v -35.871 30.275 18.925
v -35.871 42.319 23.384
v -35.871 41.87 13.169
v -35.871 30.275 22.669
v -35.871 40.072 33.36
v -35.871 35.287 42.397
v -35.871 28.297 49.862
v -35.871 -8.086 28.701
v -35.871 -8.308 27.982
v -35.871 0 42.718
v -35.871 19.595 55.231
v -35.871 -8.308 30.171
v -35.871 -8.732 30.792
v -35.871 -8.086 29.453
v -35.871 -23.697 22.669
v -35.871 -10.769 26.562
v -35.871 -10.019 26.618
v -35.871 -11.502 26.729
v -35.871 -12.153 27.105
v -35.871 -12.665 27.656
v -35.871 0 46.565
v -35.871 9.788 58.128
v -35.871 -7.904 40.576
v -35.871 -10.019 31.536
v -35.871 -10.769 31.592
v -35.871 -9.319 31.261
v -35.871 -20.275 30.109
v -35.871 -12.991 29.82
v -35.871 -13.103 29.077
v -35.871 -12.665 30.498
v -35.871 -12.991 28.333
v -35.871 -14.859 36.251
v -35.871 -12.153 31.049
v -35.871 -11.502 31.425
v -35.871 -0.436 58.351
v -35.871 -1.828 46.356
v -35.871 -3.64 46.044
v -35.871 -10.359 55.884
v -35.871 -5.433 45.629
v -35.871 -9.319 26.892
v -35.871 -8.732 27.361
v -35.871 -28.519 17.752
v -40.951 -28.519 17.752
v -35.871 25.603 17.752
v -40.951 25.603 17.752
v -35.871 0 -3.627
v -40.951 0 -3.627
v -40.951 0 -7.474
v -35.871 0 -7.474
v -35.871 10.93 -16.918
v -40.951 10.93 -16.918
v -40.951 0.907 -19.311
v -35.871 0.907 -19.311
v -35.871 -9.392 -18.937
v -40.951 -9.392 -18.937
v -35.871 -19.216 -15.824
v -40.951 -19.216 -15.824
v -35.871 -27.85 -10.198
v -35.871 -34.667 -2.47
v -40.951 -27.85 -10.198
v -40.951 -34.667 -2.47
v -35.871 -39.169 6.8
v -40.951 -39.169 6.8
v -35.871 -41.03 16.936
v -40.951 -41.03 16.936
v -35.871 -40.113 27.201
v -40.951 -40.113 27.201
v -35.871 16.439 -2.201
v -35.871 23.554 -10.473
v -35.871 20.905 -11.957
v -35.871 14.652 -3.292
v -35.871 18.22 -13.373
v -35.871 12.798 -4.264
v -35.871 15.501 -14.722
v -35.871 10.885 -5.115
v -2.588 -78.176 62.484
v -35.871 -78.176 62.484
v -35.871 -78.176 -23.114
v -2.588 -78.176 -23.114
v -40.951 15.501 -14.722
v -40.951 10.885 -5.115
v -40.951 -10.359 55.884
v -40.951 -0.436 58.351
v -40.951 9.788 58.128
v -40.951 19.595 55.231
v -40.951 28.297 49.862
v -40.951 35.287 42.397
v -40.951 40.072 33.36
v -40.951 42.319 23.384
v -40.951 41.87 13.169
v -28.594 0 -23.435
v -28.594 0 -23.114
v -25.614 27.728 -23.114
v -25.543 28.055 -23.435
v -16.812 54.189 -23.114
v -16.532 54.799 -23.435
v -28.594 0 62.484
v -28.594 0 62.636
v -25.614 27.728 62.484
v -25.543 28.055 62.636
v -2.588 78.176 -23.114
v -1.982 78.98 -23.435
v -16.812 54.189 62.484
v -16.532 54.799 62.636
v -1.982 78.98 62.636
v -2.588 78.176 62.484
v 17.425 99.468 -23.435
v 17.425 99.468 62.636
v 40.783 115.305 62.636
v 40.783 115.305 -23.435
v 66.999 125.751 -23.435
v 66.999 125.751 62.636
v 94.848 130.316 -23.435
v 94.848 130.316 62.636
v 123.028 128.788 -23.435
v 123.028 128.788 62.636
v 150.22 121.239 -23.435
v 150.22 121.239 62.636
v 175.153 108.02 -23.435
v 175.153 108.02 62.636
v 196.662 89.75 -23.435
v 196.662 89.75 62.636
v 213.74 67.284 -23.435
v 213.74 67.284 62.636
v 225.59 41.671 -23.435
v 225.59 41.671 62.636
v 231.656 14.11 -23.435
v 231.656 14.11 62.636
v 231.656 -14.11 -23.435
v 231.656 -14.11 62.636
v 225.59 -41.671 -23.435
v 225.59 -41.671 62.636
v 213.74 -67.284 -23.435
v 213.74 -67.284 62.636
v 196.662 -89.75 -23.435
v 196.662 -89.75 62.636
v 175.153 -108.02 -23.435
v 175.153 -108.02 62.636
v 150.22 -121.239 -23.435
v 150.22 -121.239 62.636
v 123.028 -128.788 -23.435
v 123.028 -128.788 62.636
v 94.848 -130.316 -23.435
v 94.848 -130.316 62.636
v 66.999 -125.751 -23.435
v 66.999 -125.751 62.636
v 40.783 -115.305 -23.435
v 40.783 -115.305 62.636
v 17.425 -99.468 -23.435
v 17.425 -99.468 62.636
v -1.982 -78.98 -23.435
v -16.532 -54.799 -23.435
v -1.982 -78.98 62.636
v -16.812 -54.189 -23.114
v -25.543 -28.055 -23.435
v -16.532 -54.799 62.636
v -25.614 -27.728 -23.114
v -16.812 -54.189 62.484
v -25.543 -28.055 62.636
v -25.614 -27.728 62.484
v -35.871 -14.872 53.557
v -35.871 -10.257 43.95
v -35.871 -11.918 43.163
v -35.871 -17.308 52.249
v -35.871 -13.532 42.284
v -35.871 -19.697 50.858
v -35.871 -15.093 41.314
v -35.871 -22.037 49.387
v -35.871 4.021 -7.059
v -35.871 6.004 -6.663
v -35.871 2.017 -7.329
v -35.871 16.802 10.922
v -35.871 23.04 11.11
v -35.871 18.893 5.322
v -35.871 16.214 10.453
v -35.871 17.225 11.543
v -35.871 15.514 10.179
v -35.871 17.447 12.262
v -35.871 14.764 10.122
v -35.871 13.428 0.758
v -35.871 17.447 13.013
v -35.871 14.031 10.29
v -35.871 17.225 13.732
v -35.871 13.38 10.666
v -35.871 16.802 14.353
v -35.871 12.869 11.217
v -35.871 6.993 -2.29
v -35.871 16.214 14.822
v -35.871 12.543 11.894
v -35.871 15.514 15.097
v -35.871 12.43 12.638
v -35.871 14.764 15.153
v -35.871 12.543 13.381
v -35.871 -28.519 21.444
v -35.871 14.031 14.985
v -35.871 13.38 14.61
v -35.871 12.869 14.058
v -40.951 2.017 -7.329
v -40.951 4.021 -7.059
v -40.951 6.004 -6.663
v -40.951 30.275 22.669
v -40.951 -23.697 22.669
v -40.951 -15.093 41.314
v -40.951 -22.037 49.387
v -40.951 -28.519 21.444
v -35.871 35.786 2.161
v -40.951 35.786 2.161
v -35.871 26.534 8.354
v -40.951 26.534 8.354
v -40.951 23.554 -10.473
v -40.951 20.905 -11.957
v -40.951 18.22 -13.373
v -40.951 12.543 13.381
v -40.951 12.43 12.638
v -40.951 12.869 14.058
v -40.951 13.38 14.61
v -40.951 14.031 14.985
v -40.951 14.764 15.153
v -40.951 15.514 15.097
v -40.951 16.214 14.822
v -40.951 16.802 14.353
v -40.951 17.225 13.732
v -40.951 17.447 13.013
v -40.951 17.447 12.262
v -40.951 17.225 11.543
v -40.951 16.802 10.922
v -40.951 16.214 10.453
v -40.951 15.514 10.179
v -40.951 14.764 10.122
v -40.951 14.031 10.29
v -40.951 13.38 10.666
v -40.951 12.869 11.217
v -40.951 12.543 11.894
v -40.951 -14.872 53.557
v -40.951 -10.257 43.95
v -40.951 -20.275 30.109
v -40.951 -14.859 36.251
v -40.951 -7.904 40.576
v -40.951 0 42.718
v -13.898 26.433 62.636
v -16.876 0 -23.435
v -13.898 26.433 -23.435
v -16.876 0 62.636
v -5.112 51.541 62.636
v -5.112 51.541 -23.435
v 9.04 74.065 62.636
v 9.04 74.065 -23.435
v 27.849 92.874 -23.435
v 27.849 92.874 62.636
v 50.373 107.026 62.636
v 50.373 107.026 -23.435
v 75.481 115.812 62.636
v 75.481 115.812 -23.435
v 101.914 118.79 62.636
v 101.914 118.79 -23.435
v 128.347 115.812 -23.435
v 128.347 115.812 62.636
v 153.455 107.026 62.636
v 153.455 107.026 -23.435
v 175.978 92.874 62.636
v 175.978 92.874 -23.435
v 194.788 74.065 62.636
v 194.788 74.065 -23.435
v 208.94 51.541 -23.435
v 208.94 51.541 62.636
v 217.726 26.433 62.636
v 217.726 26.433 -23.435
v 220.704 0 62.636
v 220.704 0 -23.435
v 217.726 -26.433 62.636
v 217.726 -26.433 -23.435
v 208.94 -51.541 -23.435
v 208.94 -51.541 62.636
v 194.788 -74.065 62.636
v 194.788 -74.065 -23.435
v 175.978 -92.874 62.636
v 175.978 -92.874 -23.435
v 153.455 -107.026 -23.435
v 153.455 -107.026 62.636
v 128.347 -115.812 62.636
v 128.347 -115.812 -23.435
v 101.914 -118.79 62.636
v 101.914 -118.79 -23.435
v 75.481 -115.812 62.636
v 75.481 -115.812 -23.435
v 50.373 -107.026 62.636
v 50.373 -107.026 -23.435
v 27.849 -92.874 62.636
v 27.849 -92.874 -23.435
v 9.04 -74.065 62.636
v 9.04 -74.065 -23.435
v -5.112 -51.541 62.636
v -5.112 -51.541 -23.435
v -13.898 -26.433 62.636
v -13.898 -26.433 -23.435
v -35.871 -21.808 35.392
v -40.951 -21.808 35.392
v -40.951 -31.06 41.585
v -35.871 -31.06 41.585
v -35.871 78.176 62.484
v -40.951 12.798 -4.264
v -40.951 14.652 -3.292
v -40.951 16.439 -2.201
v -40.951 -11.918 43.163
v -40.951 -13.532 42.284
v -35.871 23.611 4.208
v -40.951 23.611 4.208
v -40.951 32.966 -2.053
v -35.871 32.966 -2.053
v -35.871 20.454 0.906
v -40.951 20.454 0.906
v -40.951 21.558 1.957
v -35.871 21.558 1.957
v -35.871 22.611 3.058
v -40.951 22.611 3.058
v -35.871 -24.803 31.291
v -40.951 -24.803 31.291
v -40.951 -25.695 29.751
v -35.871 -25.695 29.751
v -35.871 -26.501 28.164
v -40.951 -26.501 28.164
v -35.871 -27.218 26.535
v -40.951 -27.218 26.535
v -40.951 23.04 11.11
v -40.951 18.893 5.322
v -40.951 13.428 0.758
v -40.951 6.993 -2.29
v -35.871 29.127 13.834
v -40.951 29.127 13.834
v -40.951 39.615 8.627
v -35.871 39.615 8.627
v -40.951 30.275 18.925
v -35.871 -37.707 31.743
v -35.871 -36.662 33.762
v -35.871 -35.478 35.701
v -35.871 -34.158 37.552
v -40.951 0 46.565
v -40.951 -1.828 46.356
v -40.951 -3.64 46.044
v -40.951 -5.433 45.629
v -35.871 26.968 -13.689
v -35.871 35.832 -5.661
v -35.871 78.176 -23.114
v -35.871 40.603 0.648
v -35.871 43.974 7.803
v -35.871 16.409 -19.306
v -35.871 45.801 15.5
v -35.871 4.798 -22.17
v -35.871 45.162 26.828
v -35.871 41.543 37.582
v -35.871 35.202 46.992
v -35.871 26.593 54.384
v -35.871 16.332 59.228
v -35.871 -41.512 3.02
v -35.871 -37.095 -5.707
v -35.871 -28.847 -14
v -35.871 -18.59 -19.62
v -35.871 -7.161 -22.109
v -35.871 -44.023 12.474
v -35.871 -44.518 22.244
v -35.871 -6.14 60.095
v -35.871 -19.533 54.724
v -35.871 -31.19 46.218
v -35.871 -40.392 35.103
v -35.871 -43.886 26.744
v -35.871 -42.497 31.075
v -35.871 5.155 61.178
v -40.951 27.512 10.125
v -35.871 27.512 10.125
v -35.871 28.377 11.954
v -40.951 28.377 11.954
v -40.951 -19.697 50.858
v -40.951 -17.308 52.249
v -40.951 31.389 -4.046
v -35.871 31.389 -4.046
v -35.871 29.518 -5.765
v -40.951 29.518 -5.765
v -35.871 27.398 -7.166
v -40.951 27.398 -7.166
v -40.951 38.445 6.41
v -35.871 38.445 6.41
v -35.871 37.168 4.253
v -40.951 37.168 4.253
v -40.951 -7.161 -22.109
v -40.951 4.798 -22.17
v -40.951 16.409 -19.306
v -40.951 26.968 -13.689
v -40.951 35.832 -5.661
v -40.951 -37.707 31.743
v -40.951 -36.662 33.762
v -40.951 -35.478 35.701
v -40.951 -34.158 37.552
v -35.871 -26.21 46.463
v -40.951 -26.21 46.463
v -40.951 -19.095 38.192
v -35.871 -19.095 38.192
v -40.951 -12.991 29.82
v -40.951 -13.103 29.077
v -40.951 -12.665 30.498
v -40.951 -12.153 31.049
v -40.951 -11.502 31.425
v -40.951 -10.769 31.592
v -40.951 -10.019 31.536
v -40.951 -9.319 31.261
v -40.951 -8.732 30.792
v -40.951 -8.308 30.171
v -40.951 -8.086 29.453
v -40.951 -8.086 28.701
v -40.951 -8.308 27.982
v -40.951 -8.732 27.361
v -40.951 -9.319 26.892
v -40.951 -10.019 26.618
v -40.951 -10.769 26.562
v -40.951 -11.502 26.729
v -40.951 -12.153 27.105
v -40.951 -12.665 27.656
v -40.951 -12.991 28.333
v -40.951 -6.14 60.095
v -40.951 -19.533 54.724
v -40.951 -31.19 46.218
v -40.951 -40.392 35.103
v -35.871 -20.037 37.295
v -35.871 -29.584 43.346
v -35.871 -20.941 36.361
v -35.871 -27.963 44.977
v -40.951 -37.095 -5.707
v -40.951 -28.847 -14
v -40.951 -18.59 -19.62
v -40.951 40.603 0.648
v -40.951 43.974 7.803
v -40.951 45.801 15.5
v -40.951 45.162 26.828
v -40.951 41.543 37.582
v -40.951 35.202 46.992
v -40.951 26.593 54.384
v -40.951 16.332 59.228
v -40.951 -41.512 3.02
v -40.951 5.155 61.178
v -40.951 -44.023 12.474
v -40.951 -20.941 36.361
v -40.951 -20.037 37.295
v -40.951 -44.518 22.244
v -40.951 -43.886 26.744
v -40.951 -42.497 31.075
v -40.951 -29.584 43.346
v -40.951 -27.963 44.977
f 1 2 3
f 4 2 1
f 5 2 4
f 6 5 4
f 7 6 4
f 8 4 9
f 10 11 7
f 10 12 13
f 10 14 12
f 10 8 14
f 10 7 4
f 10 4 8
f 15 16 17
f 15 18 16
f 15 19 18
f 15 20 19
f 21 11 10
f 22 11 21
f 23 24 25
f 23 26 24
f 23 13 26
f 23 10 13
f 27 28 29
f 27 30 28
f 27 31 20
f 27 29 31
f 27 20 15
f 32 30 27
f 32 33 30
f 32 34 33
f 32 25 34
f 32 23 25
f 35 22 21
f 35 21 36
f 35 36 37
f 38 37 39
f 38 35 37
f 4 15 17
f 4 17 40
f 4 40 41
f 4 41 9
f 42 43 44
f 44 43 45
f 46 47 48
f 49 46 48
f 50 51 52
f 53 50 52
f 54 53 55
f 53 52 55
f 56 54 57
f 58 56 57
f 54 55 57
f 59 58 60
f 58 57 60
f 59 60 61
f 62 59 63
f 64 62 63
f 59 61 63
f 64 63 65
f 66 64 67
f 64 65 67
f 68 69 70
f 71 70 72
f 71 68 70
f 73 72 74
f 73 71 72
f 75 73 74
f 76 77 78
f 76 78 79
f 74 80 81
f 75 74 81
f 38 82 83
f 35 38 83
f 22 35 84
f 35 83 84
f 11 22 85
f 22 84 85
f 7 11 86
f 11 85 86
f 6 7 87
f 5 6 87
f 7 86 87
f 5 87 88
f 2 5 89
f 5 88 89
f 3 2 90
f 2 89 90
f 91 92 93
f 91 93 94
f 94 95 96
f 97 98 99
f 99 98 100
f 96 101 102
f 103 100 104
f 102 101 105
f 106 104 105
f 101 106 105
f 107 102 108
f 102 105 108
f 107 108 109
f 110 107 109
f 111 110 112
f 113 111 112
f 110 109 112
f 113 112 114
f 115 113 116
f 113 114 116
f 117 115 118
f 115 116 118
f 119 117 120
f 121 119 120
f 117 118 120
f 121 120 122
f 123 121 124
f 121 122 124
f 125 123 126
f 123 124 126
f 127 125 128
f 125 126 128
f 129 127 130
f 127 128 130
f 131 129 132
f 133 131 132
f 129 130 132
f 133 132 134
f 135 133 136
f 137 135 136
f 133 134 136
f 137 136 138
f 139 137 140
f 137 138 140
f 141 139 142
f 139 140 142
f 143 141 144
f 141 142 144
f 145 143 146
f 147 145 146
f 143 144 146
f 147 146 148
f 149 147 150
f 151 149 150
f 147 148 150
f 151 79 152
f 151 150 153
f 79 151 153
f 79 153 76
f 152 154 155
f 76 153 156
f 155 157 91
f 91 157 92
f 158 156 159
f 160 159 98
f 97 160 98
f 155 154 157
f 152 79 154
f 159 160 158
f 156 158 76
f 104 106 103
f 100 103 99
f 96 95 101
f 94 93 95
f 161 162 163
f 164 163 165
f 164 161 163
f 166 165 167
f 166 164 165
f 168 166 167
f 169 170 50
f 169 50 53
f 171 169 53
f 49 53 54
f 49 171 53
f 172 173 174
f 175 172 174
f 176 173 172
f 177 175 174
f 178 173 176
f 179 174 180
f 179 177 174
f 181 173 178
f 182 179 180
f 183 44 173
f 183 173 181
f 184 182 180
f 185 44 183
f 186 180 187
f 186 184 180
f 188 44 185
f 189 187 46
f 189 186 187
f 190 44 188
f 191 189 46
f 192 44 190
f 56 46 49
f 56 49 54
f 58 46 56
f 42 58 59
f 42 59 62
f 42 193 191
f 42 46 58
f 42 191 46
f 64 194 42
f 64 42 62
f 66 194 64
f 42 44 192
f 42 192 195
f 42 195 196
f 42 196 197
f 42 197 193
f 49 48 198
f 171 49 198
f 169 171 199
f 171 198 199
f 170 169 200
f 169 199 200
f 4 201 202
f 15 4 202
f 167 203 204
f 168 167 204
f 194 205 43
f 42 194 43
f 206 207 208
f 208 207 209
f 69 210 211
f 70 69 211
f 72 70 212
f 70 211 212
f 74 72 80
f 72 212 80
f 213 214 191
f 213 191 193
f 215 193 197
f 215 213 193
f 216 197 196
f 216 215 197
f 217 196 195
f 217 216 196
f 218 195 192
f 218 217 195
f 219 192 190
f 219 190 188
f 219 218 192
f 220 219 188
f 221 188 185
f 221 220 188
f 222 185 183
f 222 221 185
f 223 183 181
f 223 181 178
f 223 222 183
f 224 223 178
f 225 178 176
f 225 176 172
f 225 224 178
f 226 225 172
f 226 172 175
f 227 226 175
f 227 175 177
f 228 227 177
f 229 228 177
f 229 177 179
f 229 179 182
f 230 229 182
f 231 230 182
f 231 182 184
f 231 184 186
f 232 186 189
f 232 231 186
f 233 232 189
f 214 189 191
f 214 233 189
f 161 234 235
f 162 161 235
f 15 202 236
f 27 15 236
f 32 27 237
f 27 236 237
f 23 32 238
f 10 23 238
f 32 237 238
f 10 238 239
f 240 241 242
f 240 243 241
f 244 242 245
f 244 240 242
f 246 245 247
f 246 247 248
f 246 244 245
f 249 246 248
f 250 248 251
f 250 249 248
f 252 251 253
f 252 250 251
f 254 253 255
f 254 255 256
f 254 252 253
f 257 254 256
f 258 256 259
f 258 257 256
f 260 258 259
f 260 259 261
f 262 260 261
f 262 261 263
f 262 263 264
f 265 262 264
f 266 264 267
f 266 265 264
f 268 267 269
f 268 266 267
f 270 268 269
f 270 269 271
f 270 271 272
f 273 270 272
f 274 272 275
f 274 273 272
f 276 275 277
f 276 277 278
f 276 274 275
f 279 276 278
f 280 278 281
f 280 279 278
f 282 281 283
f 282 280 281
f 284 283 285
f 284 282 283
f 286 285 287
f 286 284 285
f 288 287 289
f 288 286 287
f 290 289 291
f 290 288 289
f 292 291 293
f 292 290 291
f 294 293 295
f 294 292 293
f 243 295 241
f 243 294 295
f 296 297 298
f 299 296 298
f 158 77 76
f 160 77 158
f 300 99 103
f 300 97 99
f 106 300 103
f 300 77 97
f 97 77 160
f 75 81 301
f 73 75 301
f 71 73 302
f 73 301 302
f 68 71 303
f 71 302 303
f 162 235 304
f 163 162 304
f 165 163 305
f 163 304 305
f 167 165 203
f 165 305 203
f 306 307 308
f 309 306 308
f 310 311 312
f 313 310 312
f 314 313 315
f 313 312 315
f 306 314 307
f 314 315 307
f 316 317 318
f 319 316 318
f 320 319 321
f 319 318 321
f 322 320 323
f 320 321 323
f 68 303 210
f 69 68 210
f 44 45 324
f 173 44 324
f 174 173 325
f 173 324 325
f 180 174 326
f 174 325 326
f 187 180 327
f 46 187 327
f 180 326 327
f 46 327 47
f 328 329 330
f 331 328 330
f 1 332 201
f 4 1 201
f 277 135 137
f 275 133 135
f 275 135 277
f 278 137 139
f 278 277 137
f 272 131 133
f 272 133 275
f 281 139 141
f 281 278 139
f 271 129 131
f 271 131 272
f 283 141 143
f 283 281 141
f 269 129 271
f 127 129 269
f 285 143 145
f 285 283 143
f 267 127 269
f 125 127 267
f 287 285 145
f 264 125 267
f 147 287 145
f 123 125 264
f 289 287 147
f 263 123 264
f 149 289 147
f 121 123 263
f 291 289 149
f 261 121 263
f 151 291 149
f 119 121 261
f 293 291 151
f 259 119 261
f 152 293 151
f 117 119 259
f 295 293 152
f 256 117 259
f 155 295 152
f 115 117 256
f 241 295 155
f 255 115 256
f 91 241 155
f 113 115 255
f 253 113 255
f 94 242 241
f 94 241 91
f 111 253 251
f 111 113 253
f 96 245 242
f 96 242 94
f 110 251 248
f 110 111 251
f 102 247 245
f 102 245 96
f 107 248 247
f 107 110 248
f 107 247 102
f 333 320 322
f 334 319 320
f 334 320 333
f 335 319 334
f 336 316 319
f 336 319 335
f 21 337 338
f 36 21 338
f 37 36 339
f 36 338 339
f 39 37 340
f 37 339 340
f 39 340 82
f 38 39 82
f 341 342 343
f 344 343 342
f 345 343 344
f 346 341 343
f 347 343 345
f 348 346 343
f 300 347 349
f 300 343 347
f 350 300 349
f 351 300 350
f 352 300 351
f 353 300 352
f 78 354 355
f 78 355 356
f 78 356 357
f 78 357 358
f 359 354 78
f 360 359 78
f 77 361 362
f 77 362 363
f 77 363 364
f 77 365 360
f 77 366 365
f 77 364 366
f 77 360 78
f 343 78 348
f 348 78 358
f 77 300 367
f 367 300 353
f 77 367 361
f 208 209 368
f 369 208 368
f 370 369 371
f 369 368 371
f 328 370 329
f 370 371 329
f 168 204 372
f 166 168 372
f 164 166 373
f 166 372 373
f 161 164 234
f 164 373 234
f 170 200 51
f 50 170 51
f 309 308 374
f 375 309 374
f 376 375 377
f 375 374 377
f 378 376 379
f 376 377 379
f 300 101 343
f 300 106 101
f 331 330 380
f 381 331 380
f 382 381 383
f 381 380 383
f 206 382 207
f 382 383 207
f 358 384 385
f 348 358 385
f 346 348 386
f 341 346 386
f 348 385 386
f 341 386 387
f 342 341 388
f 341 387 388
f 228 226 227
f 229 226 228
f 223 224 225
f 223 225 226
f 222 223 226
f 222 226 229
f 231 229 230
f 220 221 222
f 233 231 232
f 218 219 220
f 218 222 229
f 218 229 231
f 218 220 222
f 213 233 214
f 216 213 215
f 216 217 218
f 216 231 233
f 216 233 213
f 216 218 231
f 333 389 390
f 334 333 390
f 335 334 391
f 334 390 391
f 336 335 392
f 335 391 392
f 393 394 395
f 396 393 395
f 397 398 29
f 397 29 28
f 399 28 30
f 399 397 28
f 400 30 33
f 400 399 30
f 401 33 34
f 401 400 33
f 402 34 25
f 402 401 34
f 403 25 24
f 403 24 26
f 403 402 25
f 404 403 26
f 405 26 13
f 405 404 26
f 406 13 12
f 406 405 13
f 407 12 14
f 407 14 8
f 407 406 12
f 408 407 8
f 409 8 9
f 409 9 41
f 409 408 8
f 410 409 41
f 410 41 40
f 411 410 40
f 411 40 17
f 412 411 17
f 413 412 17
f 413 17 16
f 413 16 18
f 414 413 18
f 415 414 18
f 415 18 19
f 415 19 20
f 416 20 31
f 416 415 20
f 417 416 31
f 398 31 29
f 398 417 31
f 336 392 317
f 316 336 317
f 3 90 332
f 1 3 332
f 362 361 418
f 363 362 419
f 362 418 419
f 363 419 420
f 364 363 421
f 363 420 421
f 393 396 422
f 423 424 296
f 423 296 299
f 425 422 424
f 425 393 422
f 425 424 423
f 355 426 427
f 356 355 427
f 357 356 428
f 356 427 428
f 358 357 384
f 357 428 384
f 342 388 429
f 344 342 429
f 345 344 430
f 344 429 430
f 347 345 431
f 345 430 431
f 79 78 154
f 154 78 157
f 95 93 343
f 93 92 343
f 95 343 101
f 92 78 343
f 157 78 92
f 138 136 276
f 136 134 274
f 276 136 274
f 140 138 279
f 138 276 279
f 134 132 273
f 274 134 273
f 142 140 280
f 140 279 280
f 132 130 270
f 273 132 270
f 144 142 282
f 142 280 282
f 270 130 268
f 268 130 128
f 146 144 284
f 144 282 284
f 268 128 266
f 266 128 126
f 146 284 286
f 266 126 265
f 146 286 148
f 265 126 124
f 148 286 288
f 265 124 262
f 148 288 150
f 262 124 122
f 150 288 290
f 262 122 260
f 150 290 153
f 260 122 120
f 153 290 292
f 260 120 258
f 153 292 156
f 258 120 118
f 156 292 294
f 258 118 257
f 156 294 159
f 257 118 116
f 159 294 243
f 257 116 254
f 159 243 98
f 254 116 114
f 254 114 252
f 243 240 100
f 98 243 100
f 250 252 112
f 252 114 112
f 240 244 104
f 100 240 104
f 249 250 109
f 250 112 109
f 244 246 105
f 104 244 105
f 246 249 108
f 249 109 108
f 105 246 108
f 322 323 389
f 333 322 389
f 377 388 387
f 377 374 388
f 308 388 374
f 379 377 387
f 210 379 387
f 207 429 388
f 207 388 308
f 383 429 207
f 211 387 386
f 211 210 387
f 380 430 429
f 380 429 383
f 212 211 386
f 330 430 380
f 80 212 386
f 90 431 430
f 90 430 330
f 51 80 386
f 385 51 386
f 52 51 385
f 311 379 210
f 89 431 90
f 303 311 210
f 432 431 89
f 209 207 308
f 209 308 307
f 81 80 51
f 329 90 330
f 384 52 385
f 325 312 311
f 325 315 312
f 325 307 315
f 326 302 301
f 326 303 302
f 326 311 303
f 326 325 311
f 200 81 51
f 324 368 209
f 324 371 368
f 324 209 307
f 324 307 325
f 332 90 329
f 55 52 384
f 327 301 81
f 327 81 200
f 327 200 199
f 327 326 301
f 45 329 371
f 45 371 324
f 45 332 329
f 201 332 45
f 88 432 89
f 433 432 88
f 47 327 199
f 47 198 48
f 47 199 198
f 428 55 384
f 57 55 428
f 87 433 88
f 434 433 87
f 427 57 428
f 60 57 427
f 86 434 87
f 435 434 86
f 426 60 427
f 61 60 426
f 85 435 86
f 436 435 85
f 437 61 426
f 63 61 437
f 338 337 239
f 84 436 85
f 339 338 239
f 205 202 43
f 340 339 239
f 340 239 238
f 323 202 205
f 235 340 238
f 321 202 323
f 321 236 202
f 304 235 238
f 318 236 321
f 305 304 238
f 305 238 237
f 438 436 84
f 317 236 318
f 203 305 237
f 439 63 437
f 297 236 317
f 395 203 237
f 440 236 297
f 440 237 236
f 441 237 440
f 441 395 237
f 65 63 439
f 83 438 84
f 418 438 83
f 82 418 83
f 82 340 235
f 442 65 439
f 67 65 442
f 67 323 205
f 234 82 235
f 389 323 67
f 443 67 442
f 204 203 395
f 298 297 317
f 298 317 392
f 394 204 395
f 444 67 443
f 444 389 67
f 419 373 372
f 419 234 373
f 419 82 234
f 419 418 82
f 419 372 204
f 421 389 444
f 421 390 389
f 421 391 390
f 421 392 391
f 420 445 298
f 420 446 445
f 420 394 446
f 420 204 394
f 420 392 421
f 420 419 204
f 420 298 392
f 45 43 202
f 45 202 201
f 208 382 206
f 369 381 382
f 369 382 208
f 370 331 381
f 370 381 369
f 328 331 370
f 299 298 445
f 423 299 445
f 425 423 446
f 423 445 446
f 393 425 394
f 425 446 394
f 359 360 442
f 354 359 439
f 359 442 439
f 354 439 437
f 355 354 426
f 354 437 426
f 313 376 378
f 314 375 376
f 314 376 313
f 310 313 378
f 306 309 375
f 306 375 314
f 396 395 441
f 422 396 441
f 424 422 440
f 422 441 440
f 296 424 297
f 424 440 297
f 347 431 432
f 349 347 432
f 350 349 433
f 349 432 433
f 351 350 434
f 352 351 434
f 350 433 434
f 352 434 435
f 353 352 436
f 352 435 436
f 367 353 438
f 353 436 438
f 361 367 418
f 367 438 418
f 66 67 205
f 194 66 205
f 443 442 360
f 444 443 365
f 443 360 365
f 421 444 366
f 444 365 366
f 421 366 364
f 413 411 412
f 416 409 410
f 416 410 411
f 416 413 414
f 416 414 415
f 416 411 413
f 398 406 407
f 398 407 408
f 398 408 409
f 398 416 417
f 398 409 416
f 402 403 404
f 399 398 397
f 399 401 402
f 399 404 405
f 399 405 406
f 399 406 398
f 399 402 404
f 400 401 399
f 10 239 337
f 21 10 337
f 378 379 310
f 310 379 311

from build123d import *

# Parameters (mm, degrees)
F0_W          = 11.7173120379
F0_H          = 86.0708840191
F3_DEPTH      = 62.484
F3_DEPTH_BACK = 23.114
F4_W          = 156.3523858786
F4_H          = 85.598
F4_R          = 2.5222307947
F5_DEPTH      = 5.08
F6_R          = 26.6100138709


# Not quite as in the source:
# - a feature names something its author has since deleted; it is built from what else it names


with BuildPart() as f1:
    # F0 (on Front) → F1 (revolve)
    with BuildSketch(Plane.XZ):
        with Locations((-22.7350816131, 19.6008179337)):
            Rectangle(F0_W, F0_H)
    revolve(axis=Axis((101.913869381, 0, 19.6008179337), (0, 0, -1)))

    # F2 (on Top) → F3 (join, two sides)
    with BuildSketch(Plane.XY) as f3_sk:
        Polygon((-23.8777473569, 0), (0, 78.1761929393), (-40.9507118165, 78.1761929393), (-40.9507118165, -78.1761929393), (0, -78.1761929393), align=None)
    extrude(amount=F3_DEPTH)
    extrude(f3_sk.sketch, amount=-F3_DEPTH_BACK)

    # F4 (on face) → F5 (cut)
    with BuildSketch(Plane(origin=(-40.9507118165, 0, 0), x_dir=(0, -1, 0), z_dir=(-1, 0, 0))):
        with Locations((0, 19.685)):
            Rectangle(F4_W, F4_H)
        with BuildLine():
            ThreePointArc((-45.8005852997, 15.4996816942), (-31.1457944751, 50.9769783822), (6.1403359286, 60.0954187045))
            ThreePointArc((6.1403359286, 60.0954187045), (28.1936749549, 48.849051517), (43.5657799244, 29.4446982443))
            ThreePointArc((43.5657799244, 29.4446982443), (43.8109995681, 11.2280239142), (37.0950251818, -5.7072364725))
            ThreePointArc((37.0950251818, -5.7072364725), (23.9203018158, -17.178744297), (7.161276415, -22.1086423844))
            ThreePointArc((7.161276415, -22.1086423844), (-16.4091184559, -19.3057274535), (-35.8321219683, -5.6614326371))
            ThreePointArc((-35.8321219683, -5.6614326371), (-42.4741077992, 4.1381986591), (-45.8005852997, 15.4996816942))
        make_face(mode=Mode.SUBTRACT)
        with BuildLine():
            Line((40.1134712131, 27.2007611227), (28.5185842412, 21.4439421826))
            Line((28.5185842412, 21.4439421826), (28.5185842412, 17.7521709857))
            Line((28.5185842412, 17.7521709857), (-25.6030233871, 17.7521709857))
            ThreePointArc((-25.6030233871, 17.7521709857), (-16.3053602602, 2.8665512096), (0, -3.6267871095))
            Line((0, -3.6267871095), (0, -7.4742618075))
            ThreePointArc((0, -7.4742618075), (-3.0208305793, -7.2095008507), (-6.0036519209, -6.6633391553))
            Line((-6.0036519209, -6.6633391553), (-10.9303286299, -16.9180645665))
            ThreePointArc((-10.9303286299, -16.9180645665), (27.850277377, -10.1984693401), (40.1134712131, 27.2007611227))
        make_face()
        with Locations((-14.9526894093, 12.6375420892)):
            Circle(F4_R, mode=Mode.SUBTRACT)
        with BuildLine():
            Line((-30.2748965285, 18.925355512), (-30.2748965285, 22.6689743163))
            Line((-30.2748965285, 22.6689743163), (23.6969497055, 22.6689743163))
            ThreePointArc((23.6969497055, 22.6689743163), (14.8585733056, 36.2512107395), (0, 42.7178051265))
            Line((0, 42.7178051265), (0, 46.5652798245))
            ThreePointArc((0, 46.5652798245), (2.7362509253, 46.2128562393), (5.4325754525, 45.6288138147))
            Line((5.4325754525, 45.6288138147), (10.3592521615, 55.8835392259))
            ThreePointArc((10.3592521615, 55.8835392259), (-28.2973985554, 49.8617154144), (-41.8697835003, 13.1685365719))
            Line((-41.8697835003, 13.1685365719), (-30.2748965285, 18.925355512))
        make_face()
        with Locations((10.5805564672, 29.0767555067)):
            Circle(F4_R, mode=Mode.SUBTRACT)
        with BuildLine():
            ThreePointArc((-23.5536272178, -10.4727910391), (-19.567339601, -12.673386574), (-15.5009556321, -14.7221986906))
            Line((-15.5009556321, -14.7221986906), (-10.8854688828, -5.1152055697))
            ThreePointArc((-10.8854688828, -5.1152055697), (-13.7327556617, -3.7930202048), (-16.4386400958, -2.2013526611))
            Line((-16.4386400958, -2.2013526611), (-23.5536272178, -10.4727910391))
        make_face()
        with BuildLine():
            ThreePointArc((-26.5336921008, 8.3536629544), (-27.9587005711, 11.0330778371), (-29.1266296715, 13.8341231545))
            Line((-29.1266296715, 13.8341231545), (-39.6148164121, 8.6267768283))
            ThreePointArc((-39.6148164121, 8.6267768283), (-37.8198393057, 5.3233394517), (-35.7862055506, 2.1612238524))
            Line((-35.7862055506, 2.1612238524), (-26.5336921008, 8.3536629544))
        make_face()
        with BuildLine():
            ThreePointArc((22.037269041, 49.3868926394), (18.5082065055, 51.5635703889), (14.8724930701, 53.5570086801))
            Line((14.8724930701, 53.5570086801), (10.2570063209, 43.9500155592))
            ThreePointArc((10.2570063209, 43.9500155592), (12.731329703, 42.7351985505), (15.0933792595, 41.3143613127))
            Line((15.0933792595, 41.3143613127), (22.037269041, 49.3868926394))
        make_face()
        with BuildLine():
            ThreePointArc((24.8030604194, 31.2912532728), (26.1088071334, 28.9630296891), (27.2183651143, 26.5351745401))
            Line((27.2183651143, 26.5351745401), (37.7065518548, 31.7425208664))
            ThreePointArc((37.7065518548, 31.7425208664), (36.0872429679, 34.7420367782), (34.1578114173, 37.5521170028))
            Line((34.1578114173, 37.5521170028), (24.8030604194, 31.2912532728))
        make_face()
        with BuildLine():
            ThreePointArc((-20.4539452974, 0.9064794757), (-22.0908205991, 2.5015221962), (-23.6111177136, 4.2080446007))
            Line((-23.6111177136, 4.2080446007), (-32.9658687115, -2.0528191293))
            ThreePointArc((-32.9658687115, -2.0528191293), (-30.4877258305, -4.9425156474), (-27.3978350789, -7.166051851))
            Line((-27.3978350789, -7.166051851), (-20.4539452974, 0.9064794757))
        make_face()
        with BuildLine():
            ThreePointArc((19.0953313845, 38.1919350162), (20.4937445485, 36.8328627443), (21.8078204864, 35.3920847438))
            Line((21.8078204864, 35.3920847438), (31.0603339362, 41.5845238458))
            ThreePointArc((31.0603339362, 41.5845238458), (28.7909533219, 44.1786559607), (26.2103185065, 46.4633733942))
            Line((26.2103185065, 46.4633733942), (19.0953313845, 38.1919350162))
        make_face()
    extrude(amount=-F5_DEPTH, mode=Mode.SUBTRACT)

    # F6
    f6_edges = [f1.edges().sort_by_distance(p)[0] for p in [
        (-38.410712, -43.56578, 29.444698),
    ]]
    fillet(f6_edges, radius=F6_R)


solid = f1.part
